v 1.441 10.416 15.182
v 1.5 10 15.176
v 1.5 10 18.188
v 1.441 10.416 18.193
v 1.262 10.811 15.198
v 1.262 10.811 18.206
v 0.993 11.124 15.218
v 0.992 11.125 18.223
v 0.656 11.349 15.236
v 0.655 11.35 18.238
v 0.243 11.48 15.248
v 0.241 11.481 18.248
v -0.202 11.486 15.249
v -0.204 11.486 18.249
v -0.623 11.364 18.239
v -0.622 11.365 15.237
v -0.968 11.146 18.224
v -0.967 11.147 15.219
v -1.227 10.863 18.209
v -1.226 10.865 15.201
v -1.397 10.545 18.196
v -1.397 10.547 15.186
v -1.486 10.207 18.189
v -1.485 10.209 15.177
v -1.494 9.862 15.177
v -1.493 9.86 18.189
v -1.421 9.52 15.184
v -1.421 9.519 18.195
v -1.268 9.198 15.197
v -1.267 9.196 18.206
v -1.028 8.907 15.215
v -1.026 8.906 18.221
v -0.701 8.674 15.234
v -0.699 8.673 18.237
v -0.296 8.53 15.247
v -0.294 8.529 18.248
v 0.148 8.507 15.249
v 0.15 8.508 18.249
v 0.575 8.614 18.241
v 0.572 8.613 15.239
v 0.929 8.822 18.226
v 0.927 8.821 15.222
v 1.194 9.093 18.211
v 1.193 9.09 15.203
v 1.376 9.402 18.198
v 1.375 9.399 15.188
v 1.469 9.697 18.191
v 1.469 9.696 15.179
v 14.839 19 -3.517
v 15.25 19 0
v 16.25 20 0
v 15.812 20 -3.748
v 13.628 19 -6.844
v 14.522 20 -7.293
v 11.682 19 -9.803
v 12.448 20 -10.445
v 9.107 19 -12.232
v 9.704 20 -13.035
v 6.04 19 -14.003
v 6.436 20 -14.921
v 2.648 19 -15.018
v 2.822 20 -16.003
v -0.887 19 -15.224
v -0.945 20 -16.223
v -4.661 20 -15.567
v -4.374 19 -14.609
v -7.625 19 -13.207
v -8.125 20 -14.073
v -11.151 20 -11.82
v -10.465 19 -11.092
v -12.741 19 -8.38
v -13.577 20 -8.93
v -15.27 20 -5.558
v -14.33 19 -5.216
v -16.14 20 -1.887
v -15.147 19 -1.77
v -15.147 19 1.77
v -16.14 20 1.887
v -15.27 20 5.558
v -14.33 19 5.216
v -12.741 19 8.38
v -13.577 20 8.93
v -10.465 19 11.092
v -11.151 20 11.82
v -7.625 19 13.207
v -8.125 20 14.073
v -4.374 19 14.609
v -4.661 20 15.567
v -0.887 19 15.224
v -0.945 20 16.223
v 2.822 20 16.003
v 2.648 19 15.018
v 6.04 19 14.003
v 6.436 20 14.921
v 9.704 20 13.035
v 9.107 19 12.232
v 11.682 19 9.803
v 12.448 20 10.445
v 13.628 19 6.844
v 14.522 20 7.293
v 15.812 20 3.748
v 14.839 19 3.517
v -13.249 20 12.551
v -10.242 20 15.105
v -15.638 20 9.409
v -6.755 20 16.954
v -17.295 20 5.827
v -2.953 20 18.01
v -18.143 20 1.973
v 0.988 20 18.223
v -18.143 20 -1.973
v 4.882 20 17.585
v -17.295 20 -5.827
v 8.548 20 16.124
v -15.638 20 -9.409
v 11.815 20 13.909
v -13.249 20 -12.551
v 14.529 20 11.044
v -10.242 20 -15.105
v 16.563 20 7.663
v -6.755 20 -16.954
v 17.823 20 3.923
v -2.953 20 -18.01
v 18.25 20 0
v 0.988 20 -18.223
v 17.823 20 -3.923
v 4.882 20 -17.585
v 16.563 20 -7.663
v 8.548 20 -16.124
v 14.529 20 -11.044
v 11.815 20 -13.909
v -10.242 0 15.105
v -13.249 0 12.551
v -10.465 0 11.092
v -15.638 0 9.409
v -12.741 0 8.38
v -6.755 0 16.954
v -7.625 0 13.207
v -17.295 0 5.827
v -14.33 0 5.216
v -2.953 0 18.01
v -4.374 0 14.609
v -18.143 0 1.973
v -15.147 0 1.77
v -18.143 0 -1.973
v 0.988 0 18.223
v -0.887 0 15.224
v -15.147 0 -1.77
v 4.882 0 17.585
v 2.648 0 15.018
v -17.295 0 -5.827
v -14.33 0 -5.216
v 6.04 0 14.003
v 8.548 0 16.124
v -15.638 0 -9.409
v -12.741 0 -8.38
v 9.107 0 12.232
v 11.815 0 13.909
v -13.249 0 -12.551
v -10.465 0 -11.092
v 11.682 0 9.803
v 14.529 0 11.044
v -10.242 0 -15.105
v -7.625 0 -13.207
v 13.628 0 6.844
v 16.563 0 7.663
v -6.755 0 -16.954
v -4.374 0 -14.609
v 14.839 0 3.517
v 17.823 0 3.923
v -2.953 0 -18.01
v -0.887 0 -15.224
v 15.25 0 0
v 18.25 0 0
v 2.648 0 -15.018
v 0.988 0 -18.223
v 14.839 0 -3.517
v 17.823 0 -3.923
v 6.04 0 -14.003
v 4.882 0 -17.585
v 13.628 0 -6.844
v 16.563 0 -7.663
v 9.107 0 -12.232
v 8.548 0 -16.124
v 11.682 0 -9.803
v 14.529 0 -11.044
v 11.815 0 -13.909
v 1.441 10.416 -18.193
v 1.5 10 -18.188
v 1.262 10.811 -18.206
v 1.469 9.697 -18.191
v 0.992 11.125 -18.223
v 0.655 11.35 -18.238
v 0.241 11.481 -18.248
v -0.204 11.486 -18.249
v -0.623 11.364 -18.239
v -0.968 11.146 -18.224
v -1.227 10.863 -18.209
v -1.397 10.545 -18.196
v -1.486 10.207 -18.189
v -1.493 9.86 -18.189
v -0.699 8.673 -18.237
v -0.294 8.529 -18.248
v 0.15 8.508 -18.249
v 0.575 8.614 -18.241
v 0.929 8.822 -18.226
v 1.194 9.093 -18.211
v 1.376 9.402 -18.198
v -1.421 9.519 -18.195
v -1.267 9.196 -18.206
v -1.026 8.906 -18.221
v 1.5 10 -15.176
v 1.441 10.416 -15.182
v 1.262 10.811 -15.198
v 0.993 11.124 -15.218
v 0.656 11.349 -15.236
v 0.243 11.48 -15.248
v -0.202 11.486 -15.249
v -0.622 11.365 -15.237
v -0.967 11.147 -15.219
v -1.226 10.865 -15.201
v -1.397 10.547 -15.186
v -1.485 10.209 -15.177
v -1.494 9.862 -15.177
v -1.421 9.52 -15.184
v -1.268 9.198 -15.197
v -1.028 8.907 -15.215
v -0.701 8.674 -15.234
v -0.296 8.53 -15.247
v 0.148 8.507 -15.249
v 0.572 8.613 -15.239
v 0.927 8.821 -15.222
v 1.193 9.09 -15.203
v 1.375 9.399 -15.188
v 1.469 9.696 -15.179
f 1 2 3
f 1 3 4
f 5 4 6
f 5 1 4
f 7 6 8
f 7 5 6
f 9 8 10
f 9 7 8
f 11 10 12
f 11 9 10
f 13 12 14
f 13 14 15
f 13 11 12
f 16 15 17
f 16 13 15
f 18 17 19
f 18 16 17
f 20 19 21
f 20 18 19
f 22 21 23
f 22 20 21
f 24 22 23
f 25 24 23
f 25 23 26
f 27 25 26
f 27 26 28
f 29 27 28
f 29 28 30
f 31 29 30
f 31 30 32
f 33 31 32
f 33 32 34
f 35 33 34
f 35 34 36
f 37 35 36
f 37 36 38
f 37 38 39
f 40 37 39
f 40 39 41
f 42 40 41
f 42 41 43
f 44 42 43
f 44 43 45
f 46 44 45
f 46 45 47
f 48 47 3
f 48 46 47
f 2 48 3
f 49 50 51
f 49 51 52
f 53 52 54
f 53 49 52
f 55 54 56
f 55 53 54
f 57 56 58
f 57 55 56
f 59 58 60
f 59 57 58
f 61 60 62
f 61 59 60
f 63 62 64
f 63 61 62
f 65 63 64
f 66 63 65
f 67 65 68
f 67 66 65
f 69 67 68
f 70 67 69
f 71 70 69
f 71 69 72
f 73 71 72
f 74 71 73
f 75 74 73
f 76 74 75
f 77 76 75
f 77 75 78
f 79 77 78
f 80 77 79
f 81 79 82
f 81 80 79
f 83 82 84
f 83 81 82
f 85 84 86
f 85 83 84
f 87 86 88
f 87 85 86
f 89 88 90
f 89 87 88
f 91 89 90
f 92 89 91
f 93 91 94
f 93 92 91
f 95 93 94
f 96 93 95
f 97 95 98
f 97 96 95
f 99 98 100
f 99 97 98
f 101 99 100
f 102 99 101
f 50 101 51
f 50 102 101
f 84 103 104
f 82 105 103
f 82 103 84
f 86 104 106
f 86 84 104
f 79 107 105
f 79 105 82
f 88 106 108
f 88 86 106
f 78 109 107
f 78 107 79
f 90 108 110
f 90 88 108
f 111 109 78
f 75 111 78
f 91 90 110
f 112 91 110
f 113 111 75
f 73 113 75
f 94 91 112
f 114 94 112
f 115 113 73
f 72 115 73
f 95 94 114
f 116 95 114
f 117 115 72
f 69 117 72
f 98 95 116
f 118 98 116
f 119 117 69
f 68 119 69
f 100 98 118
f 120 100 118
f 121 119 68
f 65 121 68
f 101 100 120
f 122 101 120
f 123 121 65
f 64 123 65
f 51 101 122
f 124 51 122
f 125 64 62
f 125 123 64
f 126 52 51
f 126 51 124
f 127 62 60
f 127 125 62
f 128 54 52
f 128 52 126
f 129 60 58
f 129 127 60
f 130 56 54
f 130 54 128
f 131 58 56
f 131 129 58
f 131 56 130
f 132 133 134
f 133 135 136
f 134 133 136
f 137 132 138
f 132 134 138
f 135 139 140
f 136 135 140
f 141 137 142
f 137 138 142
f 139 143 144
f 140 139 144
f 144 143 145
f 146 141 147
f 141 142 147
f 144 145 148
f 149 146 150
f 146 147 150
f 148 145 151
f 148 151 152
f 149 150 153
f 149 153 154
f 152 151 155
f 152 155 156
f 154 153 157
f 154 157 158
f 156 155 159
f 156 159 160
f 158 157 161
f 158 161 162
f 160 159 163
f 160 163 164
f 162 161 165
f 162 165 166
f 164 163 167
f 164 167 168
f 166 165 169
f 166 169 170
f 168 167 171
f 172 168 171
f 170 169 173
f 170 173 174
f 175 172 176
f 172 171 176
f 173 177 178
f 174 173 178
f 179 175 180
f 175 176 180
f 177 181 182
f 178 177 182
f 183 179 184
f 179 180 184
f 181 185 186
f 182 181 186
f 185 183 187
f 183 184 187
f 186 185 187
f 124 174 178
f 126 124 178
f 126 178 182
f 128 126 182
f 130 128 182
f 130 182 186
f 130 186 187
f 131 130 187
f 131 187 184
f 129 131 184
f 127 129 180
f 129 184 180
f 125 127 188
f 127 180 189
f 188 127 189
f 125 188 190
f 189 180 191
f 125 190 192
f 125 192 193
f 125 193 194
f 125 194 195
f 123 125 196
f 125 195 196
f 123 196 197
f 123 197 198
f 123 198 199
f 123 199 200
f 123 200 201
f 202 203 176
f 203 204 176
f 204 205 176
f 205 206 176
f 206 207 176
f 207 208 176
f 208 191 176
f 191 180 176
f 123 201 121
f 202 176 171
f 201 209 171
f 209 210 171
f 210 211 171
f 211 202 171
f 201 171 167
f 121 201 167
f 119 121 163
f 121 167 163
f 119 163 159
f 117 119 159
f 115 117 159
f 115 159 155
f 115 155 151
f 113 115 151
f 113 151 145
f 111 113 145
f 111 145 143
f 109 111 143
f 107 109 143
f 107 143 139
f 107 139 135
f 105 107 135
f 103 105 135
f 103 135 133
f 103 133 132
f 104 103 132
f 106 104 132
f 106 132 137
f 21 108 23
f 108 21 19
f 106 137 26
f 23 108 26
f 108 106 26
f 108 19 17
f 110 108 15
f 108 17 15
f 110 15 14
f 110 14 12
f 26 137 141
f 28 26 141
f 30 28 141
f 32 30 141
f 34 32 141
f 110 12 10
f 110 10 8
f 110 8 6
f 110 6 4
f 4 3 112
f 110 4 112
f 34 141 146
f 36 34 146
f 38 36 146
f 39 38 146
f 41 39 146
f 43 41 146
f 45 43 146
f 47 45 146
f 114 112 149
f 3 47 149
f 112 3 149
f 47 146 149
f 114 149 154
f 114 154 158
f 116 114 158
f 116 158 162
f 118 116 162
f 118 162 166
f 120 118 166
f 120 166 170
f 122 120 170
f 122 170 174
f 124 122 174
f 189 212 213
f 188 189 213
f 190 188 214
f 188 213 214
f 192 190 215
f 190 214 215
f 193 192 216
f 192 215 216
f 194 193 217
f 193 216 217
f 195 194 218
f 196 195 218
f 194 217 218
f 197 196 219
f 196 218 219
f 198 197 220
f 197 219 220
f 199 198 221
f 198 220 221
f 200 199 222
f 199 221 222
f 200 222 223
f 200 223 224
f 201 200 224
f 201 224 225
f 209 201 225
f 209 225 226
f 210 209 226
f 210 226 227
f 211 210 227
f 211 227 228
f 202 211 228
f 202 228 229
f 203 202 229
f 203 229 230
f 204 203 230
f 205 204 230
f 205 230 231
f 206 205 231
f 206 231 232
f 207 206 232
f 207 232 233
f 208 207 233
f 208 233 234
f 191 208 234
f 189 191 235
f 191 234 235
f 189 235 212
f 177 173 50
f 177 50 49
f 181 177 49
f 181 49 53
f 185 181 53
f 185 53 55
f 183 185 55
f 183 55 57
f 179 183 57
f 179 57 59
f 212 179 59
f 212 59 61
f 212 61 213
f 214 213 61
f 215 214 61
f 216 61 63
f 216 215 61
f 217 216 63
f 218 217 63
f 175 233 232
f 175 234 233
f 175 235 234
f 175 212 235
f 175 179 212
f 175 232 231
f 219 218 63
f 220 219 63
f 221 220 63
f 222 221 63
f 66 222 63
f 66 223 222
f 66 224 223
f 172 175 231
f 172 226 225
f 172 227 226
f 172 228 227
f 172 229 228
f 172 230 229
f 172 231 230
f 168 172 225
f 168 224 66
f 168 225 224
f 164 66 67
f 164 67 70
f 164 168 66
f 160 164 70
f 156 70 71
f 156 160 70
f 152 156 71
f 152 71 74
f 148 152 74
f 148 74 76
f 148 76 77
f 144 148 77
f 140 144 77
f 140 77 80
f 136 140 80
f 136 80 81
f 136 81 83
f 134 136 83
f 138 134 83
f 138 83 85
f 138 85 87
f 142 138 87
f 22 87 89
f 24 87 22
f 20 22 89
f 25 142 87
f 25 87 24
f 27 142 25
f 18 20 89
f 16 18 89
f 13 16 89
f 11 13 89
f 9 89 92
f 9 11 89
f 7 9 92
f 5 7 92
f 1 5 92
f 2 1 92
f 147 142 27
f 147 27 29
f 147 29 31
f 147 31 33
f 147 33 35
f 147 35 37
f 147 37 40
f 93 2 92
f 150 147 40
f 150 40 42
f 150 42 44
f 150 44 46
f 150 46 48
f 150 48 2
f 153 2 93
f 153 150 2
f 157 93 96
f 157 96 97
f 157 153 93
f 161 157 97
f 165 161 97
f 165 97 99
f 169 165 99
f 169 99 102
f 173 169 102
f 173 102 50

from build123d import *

# Parameters (mm, degrees)
SKETCH1_R               = 18.25
SKETCH1_R_2             = 15.25
BOSS_EXTRUDE1_DEPTH     = 20
SKETCH2_R               = 1.5
CUT_EXTRUDE1_DEPTH      = 19.25
CUT_EXTRUDE1_DEPTH_BACK = 19.25
CHAMFER1_SIZE           = 1


with BuildPart() as part:
    # Sketch1 → Boss-Extrude1 (new body)
    with BuildSketch(Plane(origin=(0, 0, 0), x_dir=(1, 0, 0), z_dir=(0, 1, 0))):
        Circle(SKETCH1_R)
        Circle(SKETCH1_R_2, mode=Mode.SUBTRACT)
    extrude(amount=BOSS_EXTRUDE1_DEPTH)

    # Sketch2 → Cut-Extrude1 (cut, two sides)
    with BuildSketch(Plane.XY) as cut_extrude1_sk:
        with Locations((0, 10)):
            Circle(SKETCH2_R)
    extrude(amount=CUT_EXTRUDE1_DEPTH, mode=Mode.SUBTRACT)
    extrude(cut_extrude1_sk.sketch, amount=-CUT_EXTRUDE1_DEPTH_BACK, mode=Mode.SUBTRACT)

    # Chamfer1
    chamfer1_edges = [part.edges().sort_by_distance(p)[0] for p in [
        (-15.25, 20, 0),
    ]]
    chamfer(chamfer1_edges, length=CHAMFER1_SIZE)


solid = part.part
